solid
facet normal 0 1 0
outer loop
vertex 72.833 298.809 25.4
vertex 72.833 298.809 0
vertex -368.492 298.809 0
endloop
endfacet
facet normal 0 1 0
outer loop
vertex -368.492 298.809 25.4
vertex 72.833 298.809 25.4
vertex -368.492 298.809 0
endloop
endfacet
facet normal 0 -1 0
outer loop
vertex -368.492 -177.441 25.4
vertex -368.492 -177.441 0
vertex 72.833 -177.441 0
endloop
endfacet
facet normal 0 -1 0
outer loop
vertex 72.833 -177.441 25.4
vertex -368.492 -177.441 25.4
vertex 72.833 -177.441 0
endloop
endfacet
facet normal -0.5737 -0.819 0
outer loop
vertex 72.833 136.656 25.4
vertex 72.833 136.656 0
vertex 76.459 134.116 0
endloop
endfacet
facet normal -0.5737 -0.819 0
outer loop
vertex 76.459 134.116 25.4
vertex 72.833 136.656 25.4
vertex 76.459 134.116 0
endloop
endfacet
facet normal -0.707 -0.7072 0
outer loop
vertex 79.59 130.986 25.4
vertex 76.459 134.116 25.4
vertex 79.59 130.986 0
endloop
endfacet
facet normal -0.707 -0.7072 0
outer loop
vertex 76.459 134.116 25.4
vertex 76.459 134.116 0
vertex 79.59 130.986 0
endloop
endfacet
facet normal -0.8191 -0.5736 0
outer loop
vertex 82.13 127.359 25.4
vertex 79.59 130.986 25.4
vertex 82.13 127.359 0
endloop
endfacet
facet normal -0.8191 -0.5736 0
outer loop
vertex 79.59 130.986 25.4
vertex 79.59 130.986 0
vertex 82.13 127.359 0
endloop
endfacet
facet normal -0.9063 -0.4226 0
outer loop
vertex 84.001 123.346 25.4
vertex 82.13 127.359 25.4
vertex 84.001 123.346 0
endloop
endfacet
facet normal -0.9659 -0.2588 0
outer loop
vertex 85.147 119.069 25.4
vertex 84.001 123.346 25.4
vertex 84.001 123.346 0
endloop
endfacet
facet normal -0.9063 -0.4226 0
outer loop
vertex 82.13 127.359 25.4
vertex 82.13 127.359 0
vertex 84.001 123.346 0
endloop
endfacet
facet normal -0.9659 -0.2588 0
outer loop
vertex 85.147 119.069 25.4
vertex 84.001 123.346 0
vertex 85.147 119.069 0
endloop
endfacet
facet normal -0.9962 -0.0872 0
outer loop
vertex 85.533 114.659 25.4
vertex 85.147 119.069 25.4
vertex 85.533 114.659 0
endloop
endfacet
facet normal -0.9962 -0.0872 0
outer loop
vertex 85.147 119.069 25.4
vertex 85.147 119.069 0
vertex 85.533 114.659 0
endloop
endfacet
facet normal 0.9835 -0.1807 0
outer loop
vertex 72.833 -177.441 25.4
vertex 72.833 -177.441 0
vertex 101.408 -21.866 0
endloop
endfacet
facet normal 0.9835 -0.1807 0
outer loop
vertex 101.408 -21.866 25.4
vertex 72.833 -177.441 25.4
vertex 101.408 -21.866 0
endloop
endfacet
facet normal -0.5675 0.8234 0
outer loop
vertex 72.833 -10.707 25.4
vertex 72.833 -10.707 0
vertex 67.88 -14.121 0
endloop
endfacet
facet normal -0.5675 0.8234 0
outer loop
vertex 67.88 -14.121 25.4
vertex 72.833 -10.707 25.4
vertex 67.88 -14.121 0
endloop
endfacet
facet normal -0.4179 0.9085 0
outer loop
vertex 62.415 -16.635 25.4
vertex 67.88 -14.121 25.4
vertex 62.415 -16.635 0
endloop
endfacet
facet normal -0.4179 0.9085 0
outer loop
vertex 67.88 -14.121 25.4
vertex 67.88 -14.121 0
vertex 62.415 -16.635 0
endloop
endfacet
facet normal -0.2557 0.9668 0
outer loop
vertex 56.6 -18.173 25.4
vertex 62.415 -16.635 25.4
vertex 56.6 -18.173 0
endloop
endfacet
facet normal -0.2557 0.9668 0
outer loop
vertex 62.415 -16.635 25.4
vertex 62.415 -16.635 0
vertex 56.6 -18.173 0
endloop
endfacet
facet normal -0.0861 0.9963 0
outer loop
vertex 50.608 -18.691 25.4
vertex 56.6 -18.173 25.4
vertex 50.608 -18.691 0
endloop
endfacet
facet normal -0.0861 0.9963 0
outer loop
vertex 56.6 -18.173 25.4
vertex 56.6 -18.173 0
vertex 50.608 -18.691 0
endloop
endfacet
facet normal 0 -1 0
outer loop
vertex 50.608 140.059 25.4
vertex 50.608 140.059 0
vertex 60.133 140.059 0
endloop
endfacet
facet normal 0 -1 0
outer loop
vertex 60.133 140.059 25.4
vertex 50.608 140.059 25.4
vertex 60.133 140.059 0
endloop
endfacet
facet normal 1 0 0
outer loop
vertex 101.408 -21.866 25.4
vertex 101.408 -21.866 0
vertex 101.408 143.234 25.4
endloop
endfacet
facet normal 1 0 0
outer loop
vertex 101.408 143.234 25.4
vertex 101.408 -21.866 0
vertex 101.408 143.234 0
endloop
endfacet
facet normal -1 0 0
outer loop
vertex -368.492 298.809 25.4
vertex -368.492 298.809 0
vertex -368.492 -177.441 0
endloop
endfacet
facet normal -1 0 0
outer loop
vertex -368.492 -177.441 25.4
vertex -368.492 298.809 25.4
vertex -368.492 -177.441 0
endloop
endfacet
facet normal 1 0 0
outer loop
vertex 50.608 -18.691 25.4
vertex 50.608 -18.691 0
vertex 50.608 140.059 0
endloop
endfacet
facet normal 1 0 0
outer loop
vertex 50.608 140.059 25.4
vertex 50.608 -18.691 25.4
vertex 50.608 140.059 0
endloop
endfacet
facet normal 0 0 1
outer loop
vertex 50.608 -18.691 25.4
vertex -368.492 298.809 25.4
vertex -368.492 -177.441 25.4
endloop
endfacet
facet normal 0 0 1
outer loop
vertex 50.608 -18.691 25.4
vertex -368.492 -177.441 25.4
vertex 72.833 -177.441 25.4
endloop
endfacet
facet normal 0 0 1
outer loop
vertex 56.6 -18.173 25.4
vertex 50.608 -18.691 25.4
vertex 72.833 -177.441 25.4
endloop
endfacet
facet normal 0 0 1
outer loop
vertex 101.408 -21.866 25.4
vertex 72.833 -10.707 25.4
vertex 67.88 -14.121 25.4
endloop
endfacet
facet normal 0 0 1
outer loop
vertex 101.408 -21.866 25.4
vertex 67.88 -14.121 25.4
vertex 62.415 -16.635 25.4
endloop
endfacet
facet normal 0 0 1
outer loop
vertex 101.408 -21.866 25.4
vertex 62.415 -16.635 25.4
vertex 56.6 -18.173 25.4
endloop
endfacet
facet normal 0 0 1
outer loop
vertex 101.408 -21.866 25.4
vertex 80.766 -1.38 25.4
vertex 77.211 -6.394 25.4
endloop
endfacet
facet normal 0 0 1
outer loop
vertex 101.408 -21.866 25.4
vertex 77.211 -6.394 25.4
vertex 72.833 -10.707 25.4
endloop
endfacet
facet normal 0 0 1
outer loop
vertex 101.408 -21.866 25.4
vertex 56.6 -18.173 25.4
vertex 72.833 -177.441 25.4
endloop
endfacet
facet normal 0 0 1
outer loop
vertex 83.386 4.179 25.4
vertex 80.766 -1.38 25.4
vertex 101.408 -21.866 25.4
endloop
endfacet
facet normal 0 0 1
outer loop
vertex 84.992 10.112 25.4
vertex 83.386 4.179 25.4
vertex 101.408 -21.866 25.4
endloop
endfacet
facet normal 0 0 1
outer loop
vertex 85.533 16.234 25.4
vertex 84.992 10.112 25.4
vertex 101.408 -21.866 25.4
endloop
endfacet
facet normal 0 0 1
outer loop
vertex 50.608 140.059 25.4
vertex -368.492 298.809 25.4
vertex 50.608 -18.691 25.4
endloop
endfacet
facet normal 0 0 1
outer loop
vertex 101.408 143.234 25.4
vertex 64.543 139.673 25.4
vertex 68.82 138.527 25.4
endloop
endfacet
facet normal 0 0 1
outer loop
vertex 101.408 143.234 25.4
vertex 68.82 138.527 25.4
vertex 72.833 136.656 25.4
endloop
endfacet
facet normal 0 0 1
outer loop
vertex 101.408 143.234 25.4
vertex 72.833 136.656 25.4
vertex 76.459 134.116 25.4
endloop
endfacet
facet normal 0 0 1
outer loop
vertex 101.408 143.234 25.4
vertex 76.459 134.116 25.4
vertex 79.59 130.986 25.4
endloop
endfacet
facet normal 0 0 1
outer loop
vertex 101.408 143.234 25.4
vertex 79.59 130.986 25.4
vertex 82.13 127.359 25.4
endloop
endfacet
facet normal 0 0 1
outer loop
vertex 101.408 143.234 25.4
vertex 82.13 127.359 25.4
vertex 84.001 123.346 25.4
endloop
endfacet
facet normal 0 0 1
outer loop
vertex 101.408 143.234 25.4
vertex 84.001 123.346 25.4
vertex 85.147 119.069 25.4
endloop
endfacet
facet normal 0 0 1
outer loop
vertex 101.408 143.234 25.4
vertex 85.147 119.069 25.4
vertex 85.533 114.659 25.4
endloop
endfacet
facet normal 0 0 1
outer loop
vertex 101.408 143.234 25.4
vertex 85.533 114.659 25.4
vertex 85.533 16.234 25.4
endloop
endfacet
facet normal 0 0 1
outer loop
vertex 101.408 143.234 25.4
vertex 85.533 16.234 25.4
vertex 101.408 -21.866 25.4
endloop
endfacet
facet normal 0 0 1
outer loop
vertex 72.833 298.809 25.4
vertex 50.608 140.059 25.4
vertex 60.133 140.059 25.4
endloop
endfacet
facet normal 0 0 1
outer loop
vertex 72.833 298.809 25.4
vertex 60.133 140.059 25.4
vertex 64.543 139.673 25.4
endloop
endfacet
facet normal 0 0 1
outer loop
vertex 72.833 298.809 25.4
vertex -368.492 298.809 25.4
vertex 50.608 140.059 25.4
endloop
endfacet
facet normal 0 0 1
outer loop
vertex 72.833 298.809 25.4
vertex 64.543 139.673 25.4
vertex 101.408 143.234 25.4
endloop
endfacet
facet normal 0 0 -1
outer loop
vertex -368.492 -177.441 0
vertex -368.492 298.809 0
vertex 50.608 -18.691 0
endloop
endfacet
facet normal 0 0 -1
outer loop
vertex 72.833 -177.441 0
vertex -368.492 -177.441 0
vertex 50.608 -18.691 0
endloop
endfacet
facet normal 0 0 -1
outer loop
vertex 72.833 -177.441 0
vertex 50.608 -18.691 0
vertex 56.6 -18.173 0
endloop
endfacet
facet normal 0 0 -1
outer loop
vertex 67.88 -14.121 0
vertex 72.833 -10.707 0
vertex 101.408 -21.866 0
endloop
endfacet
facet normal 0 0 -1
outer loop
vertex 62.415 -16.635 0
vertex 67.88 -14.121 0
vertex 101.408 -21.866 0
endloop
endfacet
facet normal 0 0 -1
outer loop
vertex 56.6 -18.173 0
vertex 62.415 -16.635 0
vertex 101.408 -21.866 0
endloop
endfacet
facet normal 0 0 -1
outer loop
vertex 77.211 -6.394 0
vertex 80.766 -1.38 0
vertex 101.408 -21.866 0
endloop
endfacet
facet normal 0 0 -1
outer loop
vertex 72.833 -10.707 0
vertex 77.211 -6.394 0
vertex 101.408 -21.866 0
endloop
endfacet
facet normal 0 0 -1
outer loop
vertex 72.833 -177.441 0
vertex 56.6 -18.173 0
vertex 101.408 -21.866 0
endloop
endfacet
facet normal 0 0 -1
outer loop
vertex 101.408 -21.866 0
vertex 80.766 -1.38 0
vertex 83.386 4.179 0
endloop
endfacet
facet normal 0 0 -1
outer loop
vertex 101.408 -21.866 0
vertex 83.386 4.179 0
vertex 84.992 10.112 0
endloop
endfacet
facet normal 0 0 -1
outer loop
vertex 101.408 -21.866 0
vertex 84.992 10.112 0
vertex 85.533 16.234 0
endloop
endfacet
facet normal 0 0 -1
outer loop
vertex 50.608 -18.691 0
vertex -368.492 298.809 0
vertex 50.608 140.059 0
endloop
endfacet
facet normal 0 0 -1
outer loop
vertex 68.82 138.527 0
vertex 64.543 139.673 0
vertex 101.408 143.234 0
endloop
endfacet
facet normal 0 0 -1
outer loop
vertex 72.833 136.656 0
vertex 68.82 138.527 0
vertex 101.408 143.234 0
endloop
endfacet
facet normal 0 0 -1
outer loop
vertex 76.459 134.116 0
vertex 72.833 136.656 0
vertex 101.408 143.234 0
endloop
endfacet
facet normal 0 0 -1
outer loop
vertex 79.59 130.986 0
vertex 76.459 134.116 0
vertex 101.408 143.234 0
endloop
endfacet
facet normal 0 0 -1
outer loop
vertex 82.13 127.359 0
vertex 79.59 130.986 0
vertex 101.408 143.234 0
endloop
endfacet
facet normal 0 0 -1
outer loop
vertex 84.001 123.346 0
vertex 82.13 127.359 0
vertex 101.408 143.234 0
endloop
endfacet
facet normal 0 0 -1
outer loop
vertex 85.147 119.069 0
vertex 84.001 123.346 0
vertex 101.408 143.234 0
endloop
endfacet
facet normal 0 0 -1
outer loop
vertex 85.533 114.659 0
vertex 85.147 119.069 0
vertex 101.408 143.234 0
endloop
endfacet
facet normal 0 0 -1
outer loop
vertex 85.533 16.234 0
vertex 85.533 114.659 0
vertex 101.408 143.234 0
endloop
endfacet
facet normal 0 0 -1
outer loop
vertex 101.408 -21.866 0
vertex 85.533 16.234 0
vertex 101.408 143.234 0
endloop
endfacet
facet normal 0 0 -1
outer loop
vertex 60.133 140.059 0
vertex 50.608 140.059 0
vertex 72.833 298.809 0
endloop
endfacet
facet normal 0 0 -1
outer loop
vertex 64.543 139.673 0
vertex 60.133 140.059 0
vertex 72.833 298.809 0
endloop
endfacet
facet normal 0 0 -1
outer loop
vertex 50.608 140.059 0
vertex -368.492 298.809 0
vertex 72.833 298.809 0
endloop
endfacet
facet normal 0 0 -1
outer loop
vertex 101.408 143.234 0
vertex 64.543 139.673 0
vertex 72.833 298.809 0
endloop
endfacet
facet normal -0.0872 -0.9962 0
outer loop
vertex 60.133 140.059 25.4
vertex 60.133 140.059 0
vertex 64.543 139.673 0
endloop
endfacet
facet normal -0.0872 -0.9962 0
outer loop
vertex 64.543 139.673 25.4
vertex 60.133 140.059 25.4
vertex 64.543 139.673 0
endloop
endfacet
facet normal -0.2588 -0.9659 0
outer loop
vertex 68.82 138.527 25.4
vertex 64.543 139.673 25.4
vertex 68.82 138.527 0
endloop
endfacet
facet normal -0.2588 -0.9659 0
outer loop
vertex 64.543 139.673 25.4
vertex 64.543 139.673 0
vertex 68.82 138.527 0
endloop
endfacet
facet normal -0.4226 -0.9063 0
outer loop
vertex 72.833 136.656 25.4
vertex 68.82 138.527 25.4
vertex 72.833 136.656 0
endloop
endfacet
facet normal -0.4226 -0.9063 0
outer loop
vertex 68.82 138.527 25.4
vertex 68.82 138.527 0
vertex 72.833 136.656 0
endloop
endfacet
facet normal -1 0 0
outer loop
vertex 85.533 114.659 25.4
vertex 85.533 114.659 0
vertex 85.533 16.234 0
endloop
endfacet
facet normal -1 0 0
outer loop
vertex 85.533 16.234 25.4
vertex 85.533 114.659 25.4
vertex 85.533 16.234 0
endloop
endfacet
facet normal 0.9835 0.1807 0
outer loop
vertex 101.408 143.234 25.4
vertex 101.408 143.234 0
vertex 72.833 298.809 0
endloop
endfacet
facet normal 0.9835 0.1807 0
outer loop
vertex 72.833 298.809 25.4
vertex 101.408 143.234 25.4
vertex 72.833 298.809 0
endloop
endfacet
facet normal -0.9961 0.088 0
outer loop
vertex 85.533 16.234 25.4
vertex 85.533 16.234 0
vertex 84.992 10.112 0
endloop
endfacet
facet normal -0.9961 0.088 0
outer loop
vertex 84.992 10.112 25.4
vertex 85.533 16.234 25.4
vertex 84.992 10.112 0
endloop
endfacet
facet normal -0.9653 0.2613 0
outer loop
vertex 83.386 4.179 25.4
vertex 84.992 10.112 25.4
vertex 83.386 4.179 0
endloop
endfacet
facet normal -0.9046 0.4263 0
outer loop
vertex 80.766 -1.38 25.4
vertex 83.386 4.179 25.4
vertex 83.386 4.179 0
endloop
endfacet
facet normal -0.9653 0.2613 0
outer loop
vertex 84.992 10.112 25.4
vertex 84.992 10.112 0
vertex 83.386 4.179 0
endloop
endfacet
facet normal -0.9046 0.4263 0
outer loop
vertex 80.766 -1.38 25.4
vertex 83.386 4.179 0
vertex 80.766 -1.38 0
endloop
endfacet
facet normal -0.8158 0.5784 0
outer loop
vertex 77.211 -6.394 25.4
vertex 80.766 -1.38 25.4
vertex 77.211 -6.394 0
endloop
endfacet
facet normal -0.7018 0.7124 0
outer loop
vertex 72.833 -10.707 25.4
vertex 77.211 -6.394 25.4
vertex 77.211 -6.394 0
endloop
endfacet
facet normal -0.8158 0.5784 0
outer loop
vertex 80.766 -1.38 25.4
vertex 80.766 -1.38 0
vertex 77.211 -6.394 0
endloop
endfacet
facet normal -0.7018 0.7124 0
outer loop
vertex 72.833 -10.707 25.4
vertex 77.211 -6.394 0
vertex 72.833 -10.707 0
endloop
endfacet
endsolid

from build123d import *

# Parameters (mm, degrees)
F1_DEPTH = 25.4


with BuildPart() as f1:
    # F0 (on Top) → F1 (new body)
    with BuildSketch(Plane.XY):
        Polygon((72.832607, -21.866195), (72.832607, -177.441195), (101.407607, -21.866195), align=None)
        Polygon((72.832607, 143.233805), (101.407607, 143.233805), (72.832607, 298.808805), align=None)
        with BuildLine():
            Line((-368.492393, -177.441195), (72.832607, -177.441195))
            Line((72.832607, -177.441195), (72.832607, -21.866195))
            Line((72.832607, -21.866195), (72.832607, -10.706964))
            ThreePointArc((72.832607, -10.706964), (62.415429, -16.634584), (50.607607, -18.691195))
            Line((50.607607, -18.691195), (50.607607, 140.058805))
            Line((50.607607, 140.058805), (60.132607, 140.058805))
            ThreePointArc((60.132607, 140.058805), (66.706611, 139.193321), (72.832607, 136.65585))
            Line((72.832607, 136.65585), (72.832607, 143.233805))
            Line((72.832607, 143.233805), (72.832607, 298.808805))
            Line((72.832607, 298.808805), (-368.492393, 298.808805))
            Line((-368.492393, 298.808805), (-368.492393, -177.441195))
        make_face()
        with BuildLine():
            Line((72.832607, -10.706964), (72.832607, -21.866195))
            Line((72.832607, -21.866195), (101.407607, -21.866195))
            Line((101.407607, -21.866195), (101.407607, 143.233805))
            Line((101.407607, 143.233805), (72.832607, 143.233805))
            Line((72.832607, 143.233805), (72.832607, 136.65585))
            ThreePointArc((72.832607, 136.65585), (82.129653, 127.358805), (85.532607, 114.658805))
            Line((85.532607, 114.658805), (85.532607, 16.233805))
            ThreePointArc((85.532607, 16.233805), (82.198459, 1.341735), (72.832607, -10.706964))
        make_face()
    extrude(amount=F1_DEPTH)


solid = f1.part
